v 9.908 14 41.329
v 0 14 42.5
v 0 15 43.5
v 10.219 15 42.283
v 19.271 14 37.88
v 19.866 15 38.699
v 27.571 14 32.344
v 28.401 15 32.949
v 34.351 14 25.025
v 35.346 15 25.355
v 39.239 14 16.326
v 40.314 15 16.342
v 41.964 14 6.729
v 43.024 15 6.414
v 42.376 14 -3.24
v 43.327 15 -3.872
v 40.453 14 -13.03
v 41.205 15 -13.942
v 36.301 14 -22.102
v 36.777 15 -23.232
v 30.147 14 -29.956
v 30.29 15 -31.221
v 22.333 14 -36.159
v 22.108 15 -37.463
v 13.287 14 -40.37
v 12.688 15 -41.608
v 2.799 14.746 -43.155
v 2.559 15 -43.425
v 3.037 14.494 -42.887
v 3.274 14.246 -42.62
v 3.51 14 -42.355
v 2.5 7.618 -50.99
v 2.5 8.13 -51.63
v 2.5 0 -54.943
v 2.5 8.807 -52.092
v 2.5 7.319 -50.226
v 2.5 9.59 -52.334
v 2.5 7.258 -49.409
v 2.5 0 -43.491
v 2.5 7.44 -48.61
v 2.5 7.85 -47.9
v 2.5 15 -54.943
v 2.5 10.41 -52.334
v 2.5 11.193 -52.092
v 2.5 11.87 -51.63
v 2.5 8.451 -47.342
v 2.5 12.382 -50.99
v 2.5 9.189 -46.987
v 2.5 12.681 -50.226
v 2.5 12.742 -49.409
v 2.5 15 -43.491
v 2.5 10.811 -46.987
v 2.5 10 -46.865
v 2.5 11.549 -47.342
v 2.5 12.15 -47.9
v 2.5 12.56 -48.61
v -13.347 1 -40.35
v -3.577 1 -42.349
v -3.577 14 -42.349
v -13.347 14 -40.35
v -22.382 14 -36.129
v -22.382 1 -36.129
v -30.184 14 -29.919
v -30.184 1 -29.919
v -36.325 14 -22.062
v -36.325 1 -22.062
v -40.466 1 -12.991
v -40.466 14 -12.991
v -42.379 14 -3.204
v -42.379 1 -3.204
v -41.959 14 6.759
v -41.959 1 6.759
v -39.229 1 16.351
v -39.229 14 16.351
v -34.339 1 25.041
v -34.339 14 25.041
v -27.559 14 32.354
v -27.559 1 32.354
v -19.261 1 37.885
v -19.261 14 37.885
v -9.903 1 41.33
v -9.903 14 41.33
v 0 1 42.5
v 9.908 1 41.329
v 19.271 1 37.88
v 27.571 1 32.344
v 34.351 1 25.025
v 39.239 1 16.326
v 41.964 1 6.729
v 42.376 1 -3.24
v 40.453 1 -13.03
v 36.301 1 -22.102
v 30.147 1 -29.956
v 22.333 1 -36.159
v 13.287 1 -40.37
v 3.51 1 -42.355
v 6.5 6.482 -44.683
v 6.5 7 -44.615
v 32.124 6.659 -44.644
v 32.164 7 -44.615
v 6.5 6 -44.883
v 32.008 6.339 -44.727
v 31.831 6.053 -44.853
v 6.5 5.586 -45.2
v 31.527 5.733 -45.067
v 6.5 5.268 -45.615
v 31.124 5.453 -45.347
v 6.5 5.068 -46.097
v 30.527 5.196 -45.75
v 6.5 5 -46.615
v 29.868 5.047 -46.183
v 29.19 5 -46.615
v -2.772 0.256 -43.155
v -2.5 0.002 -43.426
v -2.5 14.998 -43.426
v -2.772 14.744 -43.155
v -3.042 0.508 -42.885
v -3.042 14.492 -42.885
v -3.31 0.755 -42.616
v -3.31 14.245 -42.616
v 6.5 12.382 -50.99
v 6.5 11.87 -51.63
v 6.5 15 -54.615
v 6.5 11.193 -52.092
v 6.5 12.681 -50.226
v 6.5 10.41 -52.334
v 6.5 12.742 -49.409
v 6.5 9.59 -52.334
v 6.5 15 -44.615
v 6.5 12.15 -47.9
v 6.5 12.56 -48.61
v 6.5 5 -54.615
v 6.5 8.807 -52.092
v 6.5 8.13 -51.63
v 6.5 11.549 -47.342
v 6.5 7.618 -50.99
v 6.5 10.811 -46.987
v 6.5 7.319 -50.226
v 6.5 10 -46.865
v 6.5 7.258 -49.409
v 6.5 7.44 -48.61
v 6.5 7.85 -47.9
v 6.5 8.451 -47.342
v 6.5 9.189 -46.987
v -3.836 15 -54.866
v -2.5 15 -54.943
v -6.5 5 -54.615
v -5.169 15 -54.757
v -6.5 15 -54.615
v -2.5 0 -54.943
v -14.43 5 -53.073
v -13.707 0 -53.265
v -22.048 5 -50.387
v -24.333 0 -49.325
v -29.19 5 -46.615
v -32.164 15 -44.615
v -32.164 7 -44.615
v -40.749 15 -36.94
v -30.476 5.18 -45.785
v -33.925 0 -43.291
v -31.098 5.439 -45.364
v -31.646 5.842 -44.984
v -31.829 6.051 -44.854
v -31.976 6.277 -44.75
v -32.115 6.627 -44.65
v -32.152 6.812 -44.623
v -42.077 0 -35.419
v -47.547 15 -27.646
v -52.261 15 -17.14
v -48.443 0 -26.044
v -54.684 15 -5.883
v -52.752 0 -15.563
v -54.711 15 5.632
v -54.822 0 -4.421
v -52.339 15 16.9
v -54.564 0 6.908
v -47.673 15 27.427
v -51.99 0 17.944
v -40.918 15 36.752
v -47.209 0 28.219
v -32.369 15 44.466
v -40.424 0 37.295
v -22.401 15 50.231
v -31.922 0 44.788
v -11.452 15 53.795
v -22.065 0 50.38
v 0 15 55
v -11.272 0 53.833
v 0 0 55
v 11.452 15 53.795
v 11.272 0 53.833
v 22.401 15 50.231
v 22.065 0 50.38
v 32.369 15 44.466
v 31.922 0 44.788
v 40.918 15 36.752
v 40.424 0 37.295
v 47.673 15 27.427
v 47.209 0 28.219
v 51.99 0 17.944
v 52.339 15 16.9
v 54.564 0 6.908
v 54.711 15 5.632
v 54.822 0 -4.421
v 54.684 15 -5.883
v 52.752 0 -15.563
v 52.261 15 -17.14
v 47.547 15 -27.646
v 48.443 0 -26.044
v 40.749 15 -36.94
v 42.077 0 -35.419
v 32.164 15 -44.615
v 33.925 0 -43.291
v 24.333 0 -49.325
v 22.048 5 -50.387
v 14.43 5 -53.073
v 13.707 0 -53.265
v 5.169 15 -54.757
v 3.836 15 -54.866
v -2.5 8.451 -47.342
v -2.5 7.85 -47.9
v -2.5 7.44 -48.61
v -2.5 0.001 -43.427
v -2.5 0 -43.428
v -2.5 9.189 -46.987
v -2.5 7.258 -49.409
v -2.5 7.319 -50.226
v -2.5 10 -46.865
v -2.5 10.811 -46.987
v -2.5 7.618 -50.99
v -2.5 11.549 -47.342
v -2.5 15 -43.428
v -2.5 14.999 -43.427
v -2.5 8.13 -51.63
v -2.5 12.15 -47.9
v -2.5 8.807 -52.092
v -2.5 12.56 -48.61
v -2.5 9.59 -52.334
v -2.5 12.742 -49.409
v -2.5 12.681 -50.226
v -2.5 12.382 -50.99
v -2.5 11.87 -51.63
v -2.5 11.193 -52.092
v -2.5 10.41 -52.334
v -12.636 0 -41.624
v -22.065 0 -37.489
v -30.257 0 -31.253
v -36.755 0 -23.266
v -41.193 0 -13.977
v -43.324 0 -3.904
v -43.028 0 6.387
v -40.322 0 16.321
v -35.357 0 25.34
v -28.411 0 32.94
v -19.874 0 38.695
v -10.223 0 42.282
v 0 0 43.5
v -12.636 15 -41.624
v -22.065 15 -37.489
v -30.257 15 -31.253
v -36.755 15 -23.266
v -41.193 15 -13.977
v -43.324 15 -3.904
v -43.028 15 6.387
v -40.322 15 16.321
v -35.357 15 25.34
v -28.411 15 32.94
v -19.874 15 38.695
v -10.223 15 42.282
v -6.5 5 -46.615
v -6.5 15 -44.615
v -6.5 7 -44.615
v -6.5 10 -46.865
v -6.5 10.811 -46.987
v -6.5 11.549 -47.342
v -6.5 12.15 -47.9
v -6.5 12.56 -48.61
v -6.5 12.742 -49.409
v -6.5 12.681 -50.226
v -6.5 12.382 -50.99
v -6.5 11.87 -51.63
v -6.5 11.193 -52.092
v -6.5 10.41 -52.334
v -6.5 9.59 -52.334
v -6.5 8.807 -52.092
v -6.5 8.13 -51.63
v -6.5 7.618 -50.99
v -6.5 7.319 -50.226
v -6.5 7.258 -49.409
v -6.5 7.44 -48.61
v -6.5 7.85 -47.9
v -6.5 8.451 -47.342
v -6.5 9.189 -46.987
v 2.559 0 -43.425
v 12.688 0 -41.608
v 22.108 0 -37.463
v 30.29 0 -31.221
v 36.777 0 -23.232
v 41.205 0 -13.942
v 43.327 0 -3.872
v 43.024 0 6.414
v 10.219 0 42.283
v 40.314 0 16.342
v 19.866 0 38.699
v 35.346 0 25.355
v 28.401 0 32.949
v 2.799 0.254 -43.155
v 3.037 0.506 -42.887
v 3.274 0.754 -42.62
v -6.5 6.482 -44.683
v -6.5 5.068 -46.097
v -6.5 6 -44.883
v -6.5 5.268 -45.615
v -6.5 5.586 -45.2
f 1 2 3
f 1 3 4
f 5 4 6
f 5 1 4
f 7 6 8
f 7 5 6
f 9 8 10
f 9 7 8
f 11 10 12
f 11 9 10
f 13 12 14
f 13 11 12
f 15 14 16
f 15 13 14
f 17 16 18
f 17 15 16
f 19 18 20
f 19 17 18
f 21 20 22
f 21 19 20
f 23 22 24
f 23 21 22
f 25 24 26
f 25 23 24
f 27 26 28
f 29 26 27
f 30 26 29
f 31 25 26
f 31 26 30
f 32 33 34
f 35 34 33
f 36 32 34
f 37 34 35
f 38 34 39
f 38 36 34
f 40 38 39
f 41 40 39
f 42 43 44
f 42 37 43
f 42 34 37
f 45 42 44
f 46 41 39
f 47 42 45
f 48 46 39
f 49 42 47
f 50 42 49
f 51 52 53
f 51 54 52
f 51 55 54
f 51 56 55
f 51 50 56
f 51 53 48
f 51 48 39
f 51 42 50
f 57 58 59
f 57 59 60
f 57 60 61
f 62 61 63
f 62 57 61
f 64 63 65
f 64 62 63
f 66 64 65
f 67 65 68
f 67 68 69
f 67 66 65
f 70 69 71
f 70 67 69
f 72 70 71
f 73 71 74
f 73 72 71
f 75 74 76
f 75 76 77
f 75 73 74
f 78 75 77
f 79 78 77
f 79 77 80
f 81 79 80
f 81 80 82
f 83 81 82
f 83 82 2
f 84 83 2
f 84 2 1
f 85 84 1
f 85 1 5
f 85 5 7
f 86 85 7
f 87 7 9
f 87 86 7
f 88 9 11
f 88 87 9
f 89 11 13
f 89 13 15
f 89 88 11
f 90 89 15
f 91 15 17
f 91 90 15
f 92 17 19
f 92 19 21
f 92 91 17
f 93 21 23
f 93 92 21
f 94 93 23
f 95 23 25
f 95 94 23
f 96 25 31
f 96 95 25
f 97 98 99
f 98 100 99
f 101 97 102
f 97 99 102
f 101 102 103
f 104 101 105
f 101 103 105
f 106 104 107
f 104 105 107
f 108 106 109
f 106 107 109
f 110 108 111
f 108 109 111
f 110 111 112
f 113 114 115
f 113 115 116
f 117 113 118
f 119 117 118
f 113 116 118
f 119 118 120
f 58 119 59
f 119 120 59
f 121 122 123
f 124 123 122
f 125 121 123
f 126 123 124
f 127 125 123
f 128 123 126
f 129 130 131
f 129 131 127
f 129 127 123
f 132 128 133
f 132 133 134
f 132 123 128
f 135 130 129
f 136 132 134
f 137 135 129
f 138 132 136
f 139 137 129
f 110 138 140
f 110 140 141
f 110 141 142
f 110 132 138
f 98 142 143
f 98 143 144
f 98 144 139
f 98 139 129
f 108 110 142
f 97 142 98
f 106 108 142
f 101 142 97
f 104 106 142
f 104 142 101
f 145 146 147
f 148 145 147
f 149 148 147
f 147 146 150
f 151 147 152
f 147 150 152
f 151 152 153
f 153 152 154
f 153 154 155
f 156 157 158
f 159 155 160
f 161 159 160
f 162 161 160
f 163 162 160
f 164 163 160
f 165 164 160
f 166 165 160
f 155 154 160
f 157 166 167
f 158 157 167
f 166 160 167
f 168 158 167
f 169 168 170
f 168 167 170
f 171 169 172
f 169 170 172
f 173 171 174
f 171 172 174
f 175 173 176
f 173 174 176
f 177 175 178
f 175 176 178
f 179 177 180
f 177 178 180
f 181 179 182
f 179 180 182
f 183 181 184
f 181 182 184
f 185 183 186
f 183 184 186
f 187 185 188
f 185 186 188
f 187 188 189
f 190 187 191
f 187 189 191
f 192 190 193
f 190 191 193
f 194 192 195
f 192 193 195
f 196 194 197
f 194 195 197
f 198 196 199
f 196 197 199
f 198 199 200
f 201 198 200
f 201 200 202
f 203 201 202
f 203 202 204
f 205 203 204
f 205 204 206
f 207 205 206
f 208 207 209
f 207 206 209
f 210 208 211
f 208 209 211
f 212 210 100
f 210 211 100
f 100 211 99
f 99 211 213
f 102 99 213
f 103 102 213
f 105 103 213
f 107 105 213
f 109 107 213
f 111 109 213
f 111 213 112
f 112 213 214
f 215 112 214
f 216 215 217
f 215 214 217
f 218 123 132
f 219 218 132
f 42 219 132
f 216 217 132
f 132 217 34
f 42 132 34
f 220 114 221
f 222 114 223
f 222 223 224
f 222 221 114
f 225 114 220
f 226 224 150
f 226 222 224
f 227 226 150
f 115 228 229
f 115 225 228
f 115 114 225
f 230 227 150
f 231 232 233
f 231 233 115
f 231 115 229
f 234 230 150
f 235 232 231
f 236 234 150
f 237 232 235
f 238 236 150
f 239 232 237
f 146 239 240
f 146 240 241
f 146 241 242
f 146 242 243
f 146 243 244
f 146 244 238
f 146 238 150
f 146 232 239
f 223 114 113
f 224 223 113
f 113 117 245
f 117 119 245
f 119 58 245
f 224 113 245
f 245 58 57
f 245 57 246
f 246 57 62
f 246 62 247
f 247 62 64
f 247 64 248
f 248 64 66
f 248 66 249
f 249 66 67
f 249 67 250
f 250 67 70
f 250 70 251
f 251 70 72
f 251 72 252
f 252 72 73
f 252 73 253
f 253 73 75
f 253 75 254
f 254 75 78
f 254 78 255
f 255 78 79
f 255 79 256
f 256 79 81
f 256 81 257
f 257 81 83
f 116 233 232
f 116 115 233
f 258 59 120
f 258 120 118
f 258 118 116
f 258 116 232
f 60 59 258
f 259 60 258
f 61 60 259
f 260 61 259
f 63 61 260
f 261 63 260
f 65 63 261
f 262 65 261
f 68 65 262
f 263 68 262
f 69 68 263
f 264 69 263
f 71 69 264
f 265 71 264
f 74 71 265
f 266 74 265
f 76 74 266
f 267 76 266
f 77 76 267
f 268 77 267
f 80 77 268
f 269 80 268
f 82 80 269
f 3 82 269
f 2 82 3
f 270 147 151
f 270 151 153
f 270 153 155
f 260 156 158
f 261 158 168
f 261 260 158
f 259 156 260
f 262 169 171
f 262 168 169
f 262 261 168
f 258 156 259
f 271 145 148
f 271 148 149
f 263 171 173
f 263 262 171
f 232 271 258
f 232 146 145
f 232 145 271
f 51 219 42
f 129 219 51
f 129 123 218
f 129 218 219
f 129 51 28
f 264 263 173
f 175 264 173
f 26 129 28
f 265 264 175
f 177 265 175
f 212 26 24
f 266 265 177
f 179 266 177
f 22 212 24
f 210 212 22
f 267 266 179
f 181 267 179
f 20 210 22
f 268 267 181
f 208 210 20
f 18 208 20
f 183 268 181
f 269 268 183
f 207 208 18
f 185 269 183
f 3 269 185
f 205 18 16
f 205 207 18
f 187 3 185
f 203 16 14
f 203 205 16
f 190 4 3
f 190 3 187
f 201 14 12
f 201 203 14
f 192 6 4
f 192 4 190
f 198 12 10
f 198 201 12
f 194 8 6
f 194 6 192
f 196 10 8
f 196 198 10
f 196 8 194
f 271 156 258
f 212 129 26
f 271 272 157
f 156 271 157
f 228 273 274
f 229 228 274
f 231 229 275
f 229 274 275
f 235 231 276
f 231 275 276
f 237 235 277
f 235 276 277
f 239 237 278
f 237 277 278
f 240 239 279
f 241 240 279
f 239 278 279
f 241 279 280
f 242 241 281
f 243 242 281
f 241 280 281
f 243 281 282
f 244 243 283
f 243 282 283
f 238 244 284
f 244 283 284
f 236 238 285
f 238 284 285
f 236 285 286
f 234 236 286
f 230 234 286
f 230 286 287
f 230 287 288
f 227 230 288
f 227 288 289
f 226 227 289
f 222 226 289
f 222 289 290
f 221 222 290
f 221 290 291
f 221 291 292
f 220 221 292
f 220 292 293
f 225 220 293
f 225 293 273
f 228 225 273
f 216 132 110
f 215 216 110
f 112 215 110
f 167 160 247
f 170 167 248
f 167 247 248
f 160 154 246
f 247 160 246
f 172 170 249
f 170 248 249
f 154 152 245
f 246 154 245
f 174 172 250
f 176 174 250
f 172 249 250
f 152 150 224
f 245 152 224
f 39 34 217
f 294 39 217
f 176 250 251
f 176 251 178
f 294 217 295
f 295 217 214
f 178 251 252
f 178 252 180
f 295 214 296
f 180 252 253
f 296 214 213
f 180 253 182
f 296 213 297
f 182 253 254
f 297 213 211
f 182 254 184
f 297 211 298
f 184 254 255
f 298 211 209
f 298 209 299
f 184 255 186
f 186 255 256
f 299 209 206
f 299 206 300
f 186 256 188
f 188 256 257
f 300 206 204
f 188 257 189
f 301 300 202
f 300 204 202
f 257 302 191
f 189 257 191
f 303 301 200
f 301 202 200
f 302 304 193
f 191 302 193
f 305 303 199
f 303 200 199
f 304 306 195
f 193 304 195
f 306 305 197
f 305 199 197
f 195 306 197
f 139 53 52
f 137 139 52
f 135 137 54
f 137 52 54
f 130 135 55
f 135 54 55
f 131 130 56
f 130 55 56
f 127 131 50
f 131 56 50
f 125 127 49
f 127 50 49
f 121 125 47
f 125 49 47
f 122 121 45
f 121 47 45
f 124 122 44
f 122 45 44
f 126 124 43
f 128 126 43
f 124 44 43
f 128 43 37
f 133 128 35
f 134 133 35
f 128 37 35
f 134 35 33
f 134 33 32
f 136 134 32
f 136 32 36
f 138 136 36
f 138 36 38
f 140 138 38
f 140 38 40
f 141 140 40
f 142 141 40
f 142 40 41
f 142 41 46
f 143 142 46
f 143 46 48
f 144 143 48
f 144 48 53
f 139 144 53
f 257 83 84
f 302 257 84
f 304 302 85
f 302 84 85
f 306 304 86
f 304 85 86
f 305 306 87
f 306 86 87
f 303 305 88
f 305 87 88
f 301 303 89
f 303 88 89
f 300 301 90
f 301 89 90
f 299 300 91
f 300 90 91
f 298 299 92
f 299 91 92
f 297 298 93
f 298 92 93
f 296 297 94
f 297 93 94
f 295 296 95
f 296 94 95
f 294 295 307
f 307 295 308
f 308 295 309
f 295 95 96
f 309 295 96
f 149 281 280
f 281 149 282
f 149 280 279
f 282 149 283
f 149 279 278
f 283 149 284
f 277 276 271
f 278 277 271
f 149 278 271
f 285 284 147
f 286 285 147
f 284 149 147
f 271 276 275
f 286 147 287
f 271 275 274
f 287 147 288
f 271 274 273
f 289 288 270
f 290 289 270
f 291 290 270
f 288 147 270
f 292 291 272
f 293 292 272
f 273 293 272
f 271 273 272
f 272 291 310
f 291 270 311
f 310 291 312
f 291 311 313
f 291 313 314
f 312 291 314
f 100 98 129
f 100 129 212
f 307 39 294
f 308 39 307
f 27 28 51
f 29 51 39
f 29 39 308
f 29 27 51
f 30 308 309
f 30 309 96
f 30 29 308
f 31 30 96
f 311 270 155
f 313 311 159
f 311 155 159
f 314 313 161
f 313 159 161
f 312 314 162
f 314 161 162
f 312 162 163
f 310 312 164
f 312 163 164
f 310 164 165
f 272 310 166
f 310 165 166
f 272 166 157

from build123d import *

# Parameters (mm, degrees)
SKETCH1_R           = 55
SKETCH1_R_2         = 42.5
BOSS_EXTRUDE1_DEPTH = 15
CUT_EXTRUDE1_DEPTH  = 80.214897589
CUT_EXTRUDE2_START  = -10
CUT_EXTRUDE2_DEPTH  = 10
SKETCH4_R           = 2.75
CUT_EXTRUDE3_DEPTH  = 84.858511792
FILLET2_R           = 2
CHAMFER1_SIZE       = 1.064458421
CHAMFER1_SIZE_2     = 1


with BuildPart() as part:
    # Sketch1 → Boss-Extrude1 (new body)
    with BuildSketch(Plane(origin=(0, 0, 0), x_dir=(1, 0, 0), z_dir=(0, 1, 0))):
        with Locations(Location((0, 0, 0), (0, 0, 270))):
            Circle(SKETCH1_R)
        with Locations(Location((0, 0, 0), (0, 0, 270))):
            Circle(SKETCH1_R_2, mode=Mode.SUBTRACT)
    extrude(amount=BOSS_EXTRUDE1_DEPTH)

    # Sketch2 → Cut-Extrude1 (cut, through all)
    with BuildSketch(Plane(origin=(0, 15, 0), x_dir=(1, 0, 0), z_dir=(0, 1, 0))):
        with BuildLine():
            Line((-2.5, 42.426406871), (-2.5, 54.94315244))
            ThreePointArc((-2.5, 54.94315244), (0, 55), (2.5, 54.94315244))
            Line((2.5, 54.94315244), (2.5, 42.426406871))
            ThreePointArc((2.5, 42.426406871), (0, 42.5), (-2.5, 42.426406871))
        make_face()
    extrude(amount=-CUT_EXTRUDE1_DEPTH, mode=Mode.SUBTRACT)

    # Sketch3 → Cut-Extrude2 (cut)
    with BuildSketch(Plane(origin=(0, 15, 0), x_dir=(1, 0, 0), z_dir=(0, 1, 0)).offset(CUT_EXTRUDE2_START)):
        with BuildLine():
            Line((-6.5, 54.614558499), (-6.5, 44.614558499))
            Line((-6.5, 44.614558499), (-32.164284074, 44.614558499))
            ThreePointArc((-32.164284074, 44.614558499), (-19.96826772, 51.247129522), (-6.5, 54.614558499))
        make_face()
        with BuildLine():
            Line((6.5, 44.614558499), (32.164284074, 44.614558499))
            ThreePointArc((32.164284074, 44.614558499), (19.96826772, 51.247129522), (6.5, 54.614558499))
            Line((6.5, 54.614558499), (6.5, 44.614558499))
        make_face()
    extrude(amount=CUT_EXTRUDE2_DEPTH, mode=Mode.SUBTRACT)

    # Sketch4 → Cut-Extrude3 (cut, through all)
    with BuildSketch(Plane.ZY.offset(6.5)):
        with Locations((-49.614558499, 10)):
            Circle(SKETCH4_R)
    extrude(amount=-CUT_EXTRUDE3_DEPTH, mode=Mode.SUBTRACT)

    # Fillet2
    fillet2_edges = [part.edges().sort_by_distance(p)[0] for p in [
        (-19.332142037, 5, -44.614558499),
        (19.332142037, 5, -44.614558499),
    ]]
    fillet(fillet2_edges, radius=FILLET2_R)

    # Chamfer1
    # the kernel refuses this chamfer: 1.064458421, 1 mm, written as the material it takes off along each edge
    with BuildSketch(Plane(origin=(2.5, 17.741623876, -42.426406871), x_dir=(0, 0, -1), z_dir=(0, -1, 0))) as chamfer1_piece_1:
        with BuildLine():
            Line((CHAMFER1_SIZE, 0), (-0.071563276, 1.009590298))
            ThreePointArc((-0.071563276, 1.009590298), (-0.033856315, 0.520208167), (0, 0))
            Line((0, 0), (CHAMFER1_SIZE, 0))
        make_face()
    extrude(amount=20.483247753, mode=Mode.SUBTRACT)
    with BuildSketch(Plane(origin=(-2.5, 17.781296166, -42.426406871), x_dir=(0, 0, -1), z_dir=(0, -1, 0))) as chamfer1_piece_2:
        with BuildLine():
            Line((CHAMFER1_SIZE_2, 0), (-0.077221697, -1.077221697))
            ThreePointArc((-0.077221697, -1.077221697), (-0.03634309, -0.554912866), (0, 0))
            Line((0, 0), (CHAMFER1_SIZE_2, 0))
        make_face()
    extrude(amount=20.562592333, mode=Mode.SUBTRACT)
    # the kernel refuses this chamfer: 1.064458421, 1 mm, written as the material it takes off along each edge
    with BuildSketch(Plane(origin=(0, 0, 0), x_dir=(-0.023665071979994685, 0, -0.9997199429681204), z_dir=(0.9997199429681204, 0, -0.023665071979994685))) as chamfer1_2_piece_1:
        Polygon((42.5 + CHAMFER1_SIZE_2, 0), (42.5, CHAMFER1_SIZE_2), (42.5, 0), align=None)
    revolve(axis=Axis((0, 0, 0), (0, 1, 0)), revolution_arc=178.643964662, mode=Mode.SUBTRACT)
    with BuildSketch(Plane(origin=(0, 15, 0), x_dir=(0, 0, 1), z_dir=(-1, 0, 0))) as chamfer1_2_piece_2:
        Polygon((42.5 + CHAMFER1_SIZE_2, 0), (42.5, -CHAMFER1_SIZE_2), (42.5, 0), align=None)
    revolve(axis=Axis((0, 15, 0), (0, 1, 0)), revolution_arc=178.735465076, mode=Mode.SUBTRACT)
    with BuildSketch(Plane(origin=(0, 15, 0), x_dir=(-0.023665071979993797, 0, -0.9997199429681204), z_dir=(0.9997199429681204, 0, -0.023665071979993797))) as chamfer1_2_piece_3:
        Polygon((42.5 + CHAMFER1_SIZE_2, 0), (42.5, -CHAMFER1_SIZE_2), (42.5, 0), align=None)
    revolve(axis=Axis((0, 15, 0), (0, 1, 0)), revolution_arc=178.643964662, mode=Mode.SUBTRACT)
    with BuildSketch(Plane(origin=(0, 0, 0), x_dir=(0, 0, 1), z_dir=(-1, 0, 0))) as chamfer1_2_piece_4:
        Polygon((42.5 + CHAMFER1_SIZE_2, 0), (42.5, CHAMFER1_SIZE_2), (42.5, 0), align=None)
    revolve(axis=Axis((0, 0, 0), (0, 1, 0)), revolution_arc=178.735465076, mode=Mode.SUBTRACT)


solid = part.part
